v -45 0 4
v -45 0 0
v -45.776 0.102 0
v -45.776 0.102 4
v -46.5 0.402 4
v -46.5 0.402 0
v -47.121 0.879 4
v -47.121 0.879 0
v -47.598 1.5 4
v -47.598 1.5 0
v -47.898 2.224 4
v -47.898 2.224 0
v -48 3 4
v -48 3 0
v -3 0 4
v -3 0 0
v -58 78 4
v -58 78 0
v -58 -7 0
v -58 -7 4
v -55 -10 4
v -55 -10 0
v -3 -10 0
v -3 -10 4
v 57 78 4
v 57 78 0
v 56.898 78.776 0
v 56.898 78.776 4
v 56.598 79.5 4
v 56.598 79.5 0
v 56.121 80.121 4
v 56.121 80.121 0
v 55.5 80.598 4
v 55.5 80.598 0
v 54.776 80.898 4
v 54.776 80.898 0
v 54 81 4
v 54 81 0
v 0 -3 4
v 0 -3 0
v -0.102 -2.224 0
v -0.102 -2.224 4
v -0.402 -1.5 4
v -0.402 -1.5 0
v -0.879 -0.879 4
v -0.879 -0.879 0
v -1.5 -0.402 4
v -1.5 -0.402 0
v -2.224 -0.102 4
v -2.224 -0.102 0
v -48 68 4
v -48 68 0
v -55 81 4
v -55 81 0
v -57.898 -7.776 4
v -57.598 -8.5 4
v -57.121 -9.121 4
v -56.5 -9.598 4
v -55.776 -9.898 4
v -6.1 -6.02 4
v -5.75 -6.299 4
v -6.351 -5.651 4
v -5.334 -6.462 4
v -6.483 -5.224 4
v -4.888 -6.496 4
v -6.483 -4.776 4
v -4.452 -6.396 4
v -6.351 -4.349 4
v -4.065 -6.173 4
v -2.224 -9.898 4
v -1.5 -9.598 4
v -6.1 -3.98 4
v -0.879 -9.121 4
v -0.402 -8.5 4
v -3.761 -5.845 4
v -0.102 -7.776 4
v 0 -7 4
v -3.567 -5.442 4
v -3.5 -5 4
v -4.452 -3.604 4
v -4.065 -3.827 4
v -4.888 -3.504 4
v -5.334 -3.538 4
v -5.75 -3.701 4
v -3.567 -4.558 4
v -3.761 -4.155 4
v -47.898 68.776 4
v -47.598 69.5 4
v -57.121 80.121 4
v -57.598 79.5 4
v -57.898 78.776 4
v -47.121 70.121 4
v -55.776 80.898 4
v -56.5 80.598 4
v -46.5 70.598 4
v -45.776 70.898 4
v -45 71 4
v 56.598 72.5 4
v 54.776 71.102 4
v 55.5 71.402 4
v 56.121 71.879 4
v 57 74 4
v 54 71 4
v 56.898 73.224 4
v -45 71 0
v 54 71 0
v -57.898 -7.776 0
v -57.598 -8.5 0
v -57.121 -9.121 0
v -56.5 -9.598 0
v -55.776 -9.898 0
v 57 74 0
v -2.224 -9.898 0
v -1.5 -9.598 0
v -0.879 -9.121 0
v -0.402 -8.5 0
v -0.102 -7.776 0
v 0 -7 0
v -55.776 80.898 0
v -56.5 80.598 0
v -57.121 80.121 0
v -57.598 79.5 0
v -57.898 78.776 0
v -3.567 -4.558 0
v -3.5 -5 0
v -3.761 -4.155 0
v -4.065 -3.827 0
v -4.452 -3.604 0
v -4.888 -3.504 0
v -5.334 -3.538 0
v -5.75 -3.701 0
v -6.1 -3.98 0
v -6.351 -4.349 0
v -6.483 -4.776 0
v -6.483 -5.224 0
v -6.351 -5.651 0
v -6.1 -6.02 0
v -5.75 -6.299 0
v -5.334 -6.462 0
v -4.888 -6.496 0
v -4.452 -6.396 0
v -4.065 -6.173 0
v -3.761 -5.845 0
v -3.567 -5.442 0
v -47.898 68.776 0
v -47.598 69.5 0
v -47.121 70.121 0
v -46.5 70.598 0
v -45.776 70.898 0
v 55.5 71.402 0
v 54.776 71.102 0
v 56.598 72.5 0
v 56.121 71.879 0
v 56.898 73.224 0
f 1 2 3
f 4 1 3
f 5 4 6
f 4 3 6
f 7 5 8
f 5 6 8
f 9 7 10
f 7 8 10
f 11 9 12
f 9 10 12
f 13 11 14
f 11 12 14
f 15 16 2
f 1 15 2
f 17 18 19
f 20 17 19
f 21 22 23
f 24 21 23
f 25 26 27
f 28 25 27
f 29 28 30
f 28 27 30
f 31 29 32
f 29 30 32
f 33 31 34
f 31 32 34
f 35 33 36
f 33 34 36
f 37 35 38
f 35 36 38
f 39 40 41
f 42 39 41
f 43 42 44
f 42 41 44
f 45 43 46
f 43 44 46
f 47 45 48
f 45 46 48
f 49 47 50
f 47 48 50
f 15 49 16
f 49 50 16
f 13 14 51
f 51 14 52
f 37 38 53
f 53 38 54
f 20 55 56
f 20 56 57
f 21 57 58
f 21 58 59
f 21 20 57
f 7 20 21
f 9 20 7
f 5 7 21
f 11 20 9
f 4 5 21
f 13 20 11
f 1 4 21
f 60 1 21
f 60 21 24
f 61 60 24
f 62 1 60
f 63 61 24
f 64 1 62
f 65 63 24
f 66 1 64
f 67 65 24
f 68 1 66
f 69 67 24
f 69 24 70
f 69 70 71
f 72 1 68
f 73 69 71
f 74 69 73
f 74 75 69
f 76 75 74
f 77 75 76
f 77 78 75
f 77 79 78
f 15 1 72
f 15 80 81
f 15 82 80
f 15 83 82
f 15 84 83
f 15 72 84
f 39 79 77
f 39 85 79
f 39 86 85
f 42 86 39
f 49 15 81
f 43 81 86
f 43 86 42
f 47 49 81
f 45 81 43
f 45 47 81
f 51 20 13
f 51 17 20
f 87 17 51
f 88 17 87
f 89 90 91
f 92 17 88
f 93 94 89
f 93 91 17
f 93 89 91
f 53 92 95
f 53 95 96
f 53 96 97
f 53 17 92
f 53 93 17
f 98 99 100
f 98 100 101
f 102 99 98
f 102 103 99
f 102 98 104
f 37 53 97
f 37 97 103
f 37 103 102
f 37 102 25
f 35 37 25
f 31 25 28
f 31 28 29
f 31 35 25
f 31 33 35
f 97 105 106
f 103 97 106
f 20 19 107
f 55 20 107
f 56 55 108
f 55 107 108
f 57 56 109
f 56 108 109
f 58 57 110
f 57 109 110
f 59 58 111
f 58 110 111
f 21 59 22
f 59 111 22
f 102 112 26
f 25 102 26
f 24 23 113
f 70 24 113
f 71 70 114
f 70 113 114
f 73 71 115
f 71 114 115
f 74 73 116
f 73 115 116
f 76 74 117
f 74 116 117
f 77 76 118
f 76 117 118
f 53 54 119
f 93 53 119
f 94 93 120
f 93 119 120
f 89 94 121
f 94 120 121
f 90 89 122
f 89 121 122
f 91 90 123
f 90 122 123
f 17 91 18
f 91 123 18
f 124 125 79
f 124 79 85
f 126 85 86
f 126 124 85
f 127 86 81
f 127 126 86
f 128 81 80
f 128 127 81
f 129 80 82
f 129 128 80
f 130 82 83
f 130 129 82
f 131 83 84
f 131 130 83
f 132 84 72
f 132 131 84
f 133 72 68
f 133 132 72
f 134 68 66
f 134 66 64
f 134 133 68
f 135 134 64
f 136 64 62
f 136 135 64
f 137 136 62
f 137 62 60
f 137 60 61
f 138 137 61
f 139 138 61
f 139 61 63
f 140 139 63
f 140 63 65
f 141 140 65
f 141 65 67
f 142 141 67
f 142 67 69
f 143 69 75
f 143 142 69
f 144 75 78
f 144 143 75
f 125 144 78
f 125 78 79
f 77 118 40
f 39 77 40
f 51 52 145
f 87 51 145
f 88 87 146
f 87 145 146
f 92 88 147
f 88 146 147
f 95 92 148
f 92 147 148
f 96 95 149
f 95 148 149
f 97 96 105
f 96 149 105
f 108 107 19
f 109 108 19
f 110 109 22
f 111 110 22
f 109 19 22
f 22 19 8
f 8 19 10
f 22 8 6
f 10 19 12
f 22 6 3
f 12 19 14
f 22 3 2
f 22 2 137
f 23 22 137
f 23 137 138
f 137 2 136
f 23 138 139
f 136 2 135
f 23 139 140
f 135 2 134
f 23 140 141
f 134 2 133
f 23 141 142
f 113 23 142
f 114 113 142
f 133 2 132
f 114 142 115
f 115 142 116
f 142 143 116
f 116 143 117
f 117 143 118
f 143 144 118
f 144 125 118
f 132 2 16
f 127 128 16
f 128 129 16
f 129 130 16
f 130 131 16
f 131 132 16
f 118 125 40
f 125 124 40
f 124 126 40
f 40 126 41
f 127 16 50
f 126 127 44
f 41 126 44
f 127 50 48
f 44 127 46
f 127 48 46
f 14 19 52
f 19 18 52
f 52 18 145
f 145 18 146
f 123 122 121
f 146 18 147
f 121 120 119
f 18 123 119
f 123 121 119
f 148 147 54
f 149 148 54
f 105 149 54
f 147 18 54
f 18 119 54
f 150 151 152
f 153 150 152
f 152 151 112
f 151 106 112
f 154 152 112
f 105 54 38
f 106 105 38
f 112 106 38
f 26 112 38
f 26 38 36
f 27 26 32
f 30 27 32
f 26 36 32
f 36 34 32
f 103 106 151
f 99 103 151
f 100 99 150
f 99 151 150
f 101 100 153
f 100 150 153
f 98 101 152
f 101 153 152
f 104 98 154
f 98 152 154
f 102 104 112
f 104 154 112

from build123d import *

# Parameters (mm, degrees)
SKETCH1_R           = 1.5
BOSS_EXTRUDE1_DEPTH = 4


with BuildPart() as part:
    # Sketch1 → Boss-Extrude1 (new body)
    with BuildSketch(Plane.XY):
        with BuildLine():
            Line((-3, 0), (-45, 0))
            ThreePointArc((-45, 0), (-47.121320344, 0.878679656), (-48, 3))
            Line((-48, 3), (-48, 68))
            ThreePointArc((-48, 68), (-47.121320344, 70.121320344), (-45, 71))
            Line((-45, 71), (54, 71))
            ThreePointArc((54, 71), (56.121320344, 71.878679656), (57, 74))
            Line((57, 74), (57, 78))
            ThreePointArc((57, 78), (56.121320344, 80.121320344), (54, 81))
            Line((54, 81), (-55, 81))
            ThreePointArc((-55, 81), (-57.121320344, 80.121320344), (-58, 78))
            Line((-58, 78), (-58, -7))
            ThreePointArc((-58, -7), (-57.121320344, -9.121320344), (-55, -10))
            Line((-55, -10), (-3, -10))
            ThreePointArc((-3, -10), (-0.878679656, -9.121320344), (0, -7))
            Line((0, -7), (0, -3))
            ThreePointArc((0, -3), (-0.878679656, -0.878679656), (-3, 0))
        make_face()
        with Locations((-5, -5)):
            Circle(SKETCH1_R, mode=Mode.SUBTRACT)
    extrude(amount=BOSS_EXTRUDE1_DEPTH)


solid = part.part
